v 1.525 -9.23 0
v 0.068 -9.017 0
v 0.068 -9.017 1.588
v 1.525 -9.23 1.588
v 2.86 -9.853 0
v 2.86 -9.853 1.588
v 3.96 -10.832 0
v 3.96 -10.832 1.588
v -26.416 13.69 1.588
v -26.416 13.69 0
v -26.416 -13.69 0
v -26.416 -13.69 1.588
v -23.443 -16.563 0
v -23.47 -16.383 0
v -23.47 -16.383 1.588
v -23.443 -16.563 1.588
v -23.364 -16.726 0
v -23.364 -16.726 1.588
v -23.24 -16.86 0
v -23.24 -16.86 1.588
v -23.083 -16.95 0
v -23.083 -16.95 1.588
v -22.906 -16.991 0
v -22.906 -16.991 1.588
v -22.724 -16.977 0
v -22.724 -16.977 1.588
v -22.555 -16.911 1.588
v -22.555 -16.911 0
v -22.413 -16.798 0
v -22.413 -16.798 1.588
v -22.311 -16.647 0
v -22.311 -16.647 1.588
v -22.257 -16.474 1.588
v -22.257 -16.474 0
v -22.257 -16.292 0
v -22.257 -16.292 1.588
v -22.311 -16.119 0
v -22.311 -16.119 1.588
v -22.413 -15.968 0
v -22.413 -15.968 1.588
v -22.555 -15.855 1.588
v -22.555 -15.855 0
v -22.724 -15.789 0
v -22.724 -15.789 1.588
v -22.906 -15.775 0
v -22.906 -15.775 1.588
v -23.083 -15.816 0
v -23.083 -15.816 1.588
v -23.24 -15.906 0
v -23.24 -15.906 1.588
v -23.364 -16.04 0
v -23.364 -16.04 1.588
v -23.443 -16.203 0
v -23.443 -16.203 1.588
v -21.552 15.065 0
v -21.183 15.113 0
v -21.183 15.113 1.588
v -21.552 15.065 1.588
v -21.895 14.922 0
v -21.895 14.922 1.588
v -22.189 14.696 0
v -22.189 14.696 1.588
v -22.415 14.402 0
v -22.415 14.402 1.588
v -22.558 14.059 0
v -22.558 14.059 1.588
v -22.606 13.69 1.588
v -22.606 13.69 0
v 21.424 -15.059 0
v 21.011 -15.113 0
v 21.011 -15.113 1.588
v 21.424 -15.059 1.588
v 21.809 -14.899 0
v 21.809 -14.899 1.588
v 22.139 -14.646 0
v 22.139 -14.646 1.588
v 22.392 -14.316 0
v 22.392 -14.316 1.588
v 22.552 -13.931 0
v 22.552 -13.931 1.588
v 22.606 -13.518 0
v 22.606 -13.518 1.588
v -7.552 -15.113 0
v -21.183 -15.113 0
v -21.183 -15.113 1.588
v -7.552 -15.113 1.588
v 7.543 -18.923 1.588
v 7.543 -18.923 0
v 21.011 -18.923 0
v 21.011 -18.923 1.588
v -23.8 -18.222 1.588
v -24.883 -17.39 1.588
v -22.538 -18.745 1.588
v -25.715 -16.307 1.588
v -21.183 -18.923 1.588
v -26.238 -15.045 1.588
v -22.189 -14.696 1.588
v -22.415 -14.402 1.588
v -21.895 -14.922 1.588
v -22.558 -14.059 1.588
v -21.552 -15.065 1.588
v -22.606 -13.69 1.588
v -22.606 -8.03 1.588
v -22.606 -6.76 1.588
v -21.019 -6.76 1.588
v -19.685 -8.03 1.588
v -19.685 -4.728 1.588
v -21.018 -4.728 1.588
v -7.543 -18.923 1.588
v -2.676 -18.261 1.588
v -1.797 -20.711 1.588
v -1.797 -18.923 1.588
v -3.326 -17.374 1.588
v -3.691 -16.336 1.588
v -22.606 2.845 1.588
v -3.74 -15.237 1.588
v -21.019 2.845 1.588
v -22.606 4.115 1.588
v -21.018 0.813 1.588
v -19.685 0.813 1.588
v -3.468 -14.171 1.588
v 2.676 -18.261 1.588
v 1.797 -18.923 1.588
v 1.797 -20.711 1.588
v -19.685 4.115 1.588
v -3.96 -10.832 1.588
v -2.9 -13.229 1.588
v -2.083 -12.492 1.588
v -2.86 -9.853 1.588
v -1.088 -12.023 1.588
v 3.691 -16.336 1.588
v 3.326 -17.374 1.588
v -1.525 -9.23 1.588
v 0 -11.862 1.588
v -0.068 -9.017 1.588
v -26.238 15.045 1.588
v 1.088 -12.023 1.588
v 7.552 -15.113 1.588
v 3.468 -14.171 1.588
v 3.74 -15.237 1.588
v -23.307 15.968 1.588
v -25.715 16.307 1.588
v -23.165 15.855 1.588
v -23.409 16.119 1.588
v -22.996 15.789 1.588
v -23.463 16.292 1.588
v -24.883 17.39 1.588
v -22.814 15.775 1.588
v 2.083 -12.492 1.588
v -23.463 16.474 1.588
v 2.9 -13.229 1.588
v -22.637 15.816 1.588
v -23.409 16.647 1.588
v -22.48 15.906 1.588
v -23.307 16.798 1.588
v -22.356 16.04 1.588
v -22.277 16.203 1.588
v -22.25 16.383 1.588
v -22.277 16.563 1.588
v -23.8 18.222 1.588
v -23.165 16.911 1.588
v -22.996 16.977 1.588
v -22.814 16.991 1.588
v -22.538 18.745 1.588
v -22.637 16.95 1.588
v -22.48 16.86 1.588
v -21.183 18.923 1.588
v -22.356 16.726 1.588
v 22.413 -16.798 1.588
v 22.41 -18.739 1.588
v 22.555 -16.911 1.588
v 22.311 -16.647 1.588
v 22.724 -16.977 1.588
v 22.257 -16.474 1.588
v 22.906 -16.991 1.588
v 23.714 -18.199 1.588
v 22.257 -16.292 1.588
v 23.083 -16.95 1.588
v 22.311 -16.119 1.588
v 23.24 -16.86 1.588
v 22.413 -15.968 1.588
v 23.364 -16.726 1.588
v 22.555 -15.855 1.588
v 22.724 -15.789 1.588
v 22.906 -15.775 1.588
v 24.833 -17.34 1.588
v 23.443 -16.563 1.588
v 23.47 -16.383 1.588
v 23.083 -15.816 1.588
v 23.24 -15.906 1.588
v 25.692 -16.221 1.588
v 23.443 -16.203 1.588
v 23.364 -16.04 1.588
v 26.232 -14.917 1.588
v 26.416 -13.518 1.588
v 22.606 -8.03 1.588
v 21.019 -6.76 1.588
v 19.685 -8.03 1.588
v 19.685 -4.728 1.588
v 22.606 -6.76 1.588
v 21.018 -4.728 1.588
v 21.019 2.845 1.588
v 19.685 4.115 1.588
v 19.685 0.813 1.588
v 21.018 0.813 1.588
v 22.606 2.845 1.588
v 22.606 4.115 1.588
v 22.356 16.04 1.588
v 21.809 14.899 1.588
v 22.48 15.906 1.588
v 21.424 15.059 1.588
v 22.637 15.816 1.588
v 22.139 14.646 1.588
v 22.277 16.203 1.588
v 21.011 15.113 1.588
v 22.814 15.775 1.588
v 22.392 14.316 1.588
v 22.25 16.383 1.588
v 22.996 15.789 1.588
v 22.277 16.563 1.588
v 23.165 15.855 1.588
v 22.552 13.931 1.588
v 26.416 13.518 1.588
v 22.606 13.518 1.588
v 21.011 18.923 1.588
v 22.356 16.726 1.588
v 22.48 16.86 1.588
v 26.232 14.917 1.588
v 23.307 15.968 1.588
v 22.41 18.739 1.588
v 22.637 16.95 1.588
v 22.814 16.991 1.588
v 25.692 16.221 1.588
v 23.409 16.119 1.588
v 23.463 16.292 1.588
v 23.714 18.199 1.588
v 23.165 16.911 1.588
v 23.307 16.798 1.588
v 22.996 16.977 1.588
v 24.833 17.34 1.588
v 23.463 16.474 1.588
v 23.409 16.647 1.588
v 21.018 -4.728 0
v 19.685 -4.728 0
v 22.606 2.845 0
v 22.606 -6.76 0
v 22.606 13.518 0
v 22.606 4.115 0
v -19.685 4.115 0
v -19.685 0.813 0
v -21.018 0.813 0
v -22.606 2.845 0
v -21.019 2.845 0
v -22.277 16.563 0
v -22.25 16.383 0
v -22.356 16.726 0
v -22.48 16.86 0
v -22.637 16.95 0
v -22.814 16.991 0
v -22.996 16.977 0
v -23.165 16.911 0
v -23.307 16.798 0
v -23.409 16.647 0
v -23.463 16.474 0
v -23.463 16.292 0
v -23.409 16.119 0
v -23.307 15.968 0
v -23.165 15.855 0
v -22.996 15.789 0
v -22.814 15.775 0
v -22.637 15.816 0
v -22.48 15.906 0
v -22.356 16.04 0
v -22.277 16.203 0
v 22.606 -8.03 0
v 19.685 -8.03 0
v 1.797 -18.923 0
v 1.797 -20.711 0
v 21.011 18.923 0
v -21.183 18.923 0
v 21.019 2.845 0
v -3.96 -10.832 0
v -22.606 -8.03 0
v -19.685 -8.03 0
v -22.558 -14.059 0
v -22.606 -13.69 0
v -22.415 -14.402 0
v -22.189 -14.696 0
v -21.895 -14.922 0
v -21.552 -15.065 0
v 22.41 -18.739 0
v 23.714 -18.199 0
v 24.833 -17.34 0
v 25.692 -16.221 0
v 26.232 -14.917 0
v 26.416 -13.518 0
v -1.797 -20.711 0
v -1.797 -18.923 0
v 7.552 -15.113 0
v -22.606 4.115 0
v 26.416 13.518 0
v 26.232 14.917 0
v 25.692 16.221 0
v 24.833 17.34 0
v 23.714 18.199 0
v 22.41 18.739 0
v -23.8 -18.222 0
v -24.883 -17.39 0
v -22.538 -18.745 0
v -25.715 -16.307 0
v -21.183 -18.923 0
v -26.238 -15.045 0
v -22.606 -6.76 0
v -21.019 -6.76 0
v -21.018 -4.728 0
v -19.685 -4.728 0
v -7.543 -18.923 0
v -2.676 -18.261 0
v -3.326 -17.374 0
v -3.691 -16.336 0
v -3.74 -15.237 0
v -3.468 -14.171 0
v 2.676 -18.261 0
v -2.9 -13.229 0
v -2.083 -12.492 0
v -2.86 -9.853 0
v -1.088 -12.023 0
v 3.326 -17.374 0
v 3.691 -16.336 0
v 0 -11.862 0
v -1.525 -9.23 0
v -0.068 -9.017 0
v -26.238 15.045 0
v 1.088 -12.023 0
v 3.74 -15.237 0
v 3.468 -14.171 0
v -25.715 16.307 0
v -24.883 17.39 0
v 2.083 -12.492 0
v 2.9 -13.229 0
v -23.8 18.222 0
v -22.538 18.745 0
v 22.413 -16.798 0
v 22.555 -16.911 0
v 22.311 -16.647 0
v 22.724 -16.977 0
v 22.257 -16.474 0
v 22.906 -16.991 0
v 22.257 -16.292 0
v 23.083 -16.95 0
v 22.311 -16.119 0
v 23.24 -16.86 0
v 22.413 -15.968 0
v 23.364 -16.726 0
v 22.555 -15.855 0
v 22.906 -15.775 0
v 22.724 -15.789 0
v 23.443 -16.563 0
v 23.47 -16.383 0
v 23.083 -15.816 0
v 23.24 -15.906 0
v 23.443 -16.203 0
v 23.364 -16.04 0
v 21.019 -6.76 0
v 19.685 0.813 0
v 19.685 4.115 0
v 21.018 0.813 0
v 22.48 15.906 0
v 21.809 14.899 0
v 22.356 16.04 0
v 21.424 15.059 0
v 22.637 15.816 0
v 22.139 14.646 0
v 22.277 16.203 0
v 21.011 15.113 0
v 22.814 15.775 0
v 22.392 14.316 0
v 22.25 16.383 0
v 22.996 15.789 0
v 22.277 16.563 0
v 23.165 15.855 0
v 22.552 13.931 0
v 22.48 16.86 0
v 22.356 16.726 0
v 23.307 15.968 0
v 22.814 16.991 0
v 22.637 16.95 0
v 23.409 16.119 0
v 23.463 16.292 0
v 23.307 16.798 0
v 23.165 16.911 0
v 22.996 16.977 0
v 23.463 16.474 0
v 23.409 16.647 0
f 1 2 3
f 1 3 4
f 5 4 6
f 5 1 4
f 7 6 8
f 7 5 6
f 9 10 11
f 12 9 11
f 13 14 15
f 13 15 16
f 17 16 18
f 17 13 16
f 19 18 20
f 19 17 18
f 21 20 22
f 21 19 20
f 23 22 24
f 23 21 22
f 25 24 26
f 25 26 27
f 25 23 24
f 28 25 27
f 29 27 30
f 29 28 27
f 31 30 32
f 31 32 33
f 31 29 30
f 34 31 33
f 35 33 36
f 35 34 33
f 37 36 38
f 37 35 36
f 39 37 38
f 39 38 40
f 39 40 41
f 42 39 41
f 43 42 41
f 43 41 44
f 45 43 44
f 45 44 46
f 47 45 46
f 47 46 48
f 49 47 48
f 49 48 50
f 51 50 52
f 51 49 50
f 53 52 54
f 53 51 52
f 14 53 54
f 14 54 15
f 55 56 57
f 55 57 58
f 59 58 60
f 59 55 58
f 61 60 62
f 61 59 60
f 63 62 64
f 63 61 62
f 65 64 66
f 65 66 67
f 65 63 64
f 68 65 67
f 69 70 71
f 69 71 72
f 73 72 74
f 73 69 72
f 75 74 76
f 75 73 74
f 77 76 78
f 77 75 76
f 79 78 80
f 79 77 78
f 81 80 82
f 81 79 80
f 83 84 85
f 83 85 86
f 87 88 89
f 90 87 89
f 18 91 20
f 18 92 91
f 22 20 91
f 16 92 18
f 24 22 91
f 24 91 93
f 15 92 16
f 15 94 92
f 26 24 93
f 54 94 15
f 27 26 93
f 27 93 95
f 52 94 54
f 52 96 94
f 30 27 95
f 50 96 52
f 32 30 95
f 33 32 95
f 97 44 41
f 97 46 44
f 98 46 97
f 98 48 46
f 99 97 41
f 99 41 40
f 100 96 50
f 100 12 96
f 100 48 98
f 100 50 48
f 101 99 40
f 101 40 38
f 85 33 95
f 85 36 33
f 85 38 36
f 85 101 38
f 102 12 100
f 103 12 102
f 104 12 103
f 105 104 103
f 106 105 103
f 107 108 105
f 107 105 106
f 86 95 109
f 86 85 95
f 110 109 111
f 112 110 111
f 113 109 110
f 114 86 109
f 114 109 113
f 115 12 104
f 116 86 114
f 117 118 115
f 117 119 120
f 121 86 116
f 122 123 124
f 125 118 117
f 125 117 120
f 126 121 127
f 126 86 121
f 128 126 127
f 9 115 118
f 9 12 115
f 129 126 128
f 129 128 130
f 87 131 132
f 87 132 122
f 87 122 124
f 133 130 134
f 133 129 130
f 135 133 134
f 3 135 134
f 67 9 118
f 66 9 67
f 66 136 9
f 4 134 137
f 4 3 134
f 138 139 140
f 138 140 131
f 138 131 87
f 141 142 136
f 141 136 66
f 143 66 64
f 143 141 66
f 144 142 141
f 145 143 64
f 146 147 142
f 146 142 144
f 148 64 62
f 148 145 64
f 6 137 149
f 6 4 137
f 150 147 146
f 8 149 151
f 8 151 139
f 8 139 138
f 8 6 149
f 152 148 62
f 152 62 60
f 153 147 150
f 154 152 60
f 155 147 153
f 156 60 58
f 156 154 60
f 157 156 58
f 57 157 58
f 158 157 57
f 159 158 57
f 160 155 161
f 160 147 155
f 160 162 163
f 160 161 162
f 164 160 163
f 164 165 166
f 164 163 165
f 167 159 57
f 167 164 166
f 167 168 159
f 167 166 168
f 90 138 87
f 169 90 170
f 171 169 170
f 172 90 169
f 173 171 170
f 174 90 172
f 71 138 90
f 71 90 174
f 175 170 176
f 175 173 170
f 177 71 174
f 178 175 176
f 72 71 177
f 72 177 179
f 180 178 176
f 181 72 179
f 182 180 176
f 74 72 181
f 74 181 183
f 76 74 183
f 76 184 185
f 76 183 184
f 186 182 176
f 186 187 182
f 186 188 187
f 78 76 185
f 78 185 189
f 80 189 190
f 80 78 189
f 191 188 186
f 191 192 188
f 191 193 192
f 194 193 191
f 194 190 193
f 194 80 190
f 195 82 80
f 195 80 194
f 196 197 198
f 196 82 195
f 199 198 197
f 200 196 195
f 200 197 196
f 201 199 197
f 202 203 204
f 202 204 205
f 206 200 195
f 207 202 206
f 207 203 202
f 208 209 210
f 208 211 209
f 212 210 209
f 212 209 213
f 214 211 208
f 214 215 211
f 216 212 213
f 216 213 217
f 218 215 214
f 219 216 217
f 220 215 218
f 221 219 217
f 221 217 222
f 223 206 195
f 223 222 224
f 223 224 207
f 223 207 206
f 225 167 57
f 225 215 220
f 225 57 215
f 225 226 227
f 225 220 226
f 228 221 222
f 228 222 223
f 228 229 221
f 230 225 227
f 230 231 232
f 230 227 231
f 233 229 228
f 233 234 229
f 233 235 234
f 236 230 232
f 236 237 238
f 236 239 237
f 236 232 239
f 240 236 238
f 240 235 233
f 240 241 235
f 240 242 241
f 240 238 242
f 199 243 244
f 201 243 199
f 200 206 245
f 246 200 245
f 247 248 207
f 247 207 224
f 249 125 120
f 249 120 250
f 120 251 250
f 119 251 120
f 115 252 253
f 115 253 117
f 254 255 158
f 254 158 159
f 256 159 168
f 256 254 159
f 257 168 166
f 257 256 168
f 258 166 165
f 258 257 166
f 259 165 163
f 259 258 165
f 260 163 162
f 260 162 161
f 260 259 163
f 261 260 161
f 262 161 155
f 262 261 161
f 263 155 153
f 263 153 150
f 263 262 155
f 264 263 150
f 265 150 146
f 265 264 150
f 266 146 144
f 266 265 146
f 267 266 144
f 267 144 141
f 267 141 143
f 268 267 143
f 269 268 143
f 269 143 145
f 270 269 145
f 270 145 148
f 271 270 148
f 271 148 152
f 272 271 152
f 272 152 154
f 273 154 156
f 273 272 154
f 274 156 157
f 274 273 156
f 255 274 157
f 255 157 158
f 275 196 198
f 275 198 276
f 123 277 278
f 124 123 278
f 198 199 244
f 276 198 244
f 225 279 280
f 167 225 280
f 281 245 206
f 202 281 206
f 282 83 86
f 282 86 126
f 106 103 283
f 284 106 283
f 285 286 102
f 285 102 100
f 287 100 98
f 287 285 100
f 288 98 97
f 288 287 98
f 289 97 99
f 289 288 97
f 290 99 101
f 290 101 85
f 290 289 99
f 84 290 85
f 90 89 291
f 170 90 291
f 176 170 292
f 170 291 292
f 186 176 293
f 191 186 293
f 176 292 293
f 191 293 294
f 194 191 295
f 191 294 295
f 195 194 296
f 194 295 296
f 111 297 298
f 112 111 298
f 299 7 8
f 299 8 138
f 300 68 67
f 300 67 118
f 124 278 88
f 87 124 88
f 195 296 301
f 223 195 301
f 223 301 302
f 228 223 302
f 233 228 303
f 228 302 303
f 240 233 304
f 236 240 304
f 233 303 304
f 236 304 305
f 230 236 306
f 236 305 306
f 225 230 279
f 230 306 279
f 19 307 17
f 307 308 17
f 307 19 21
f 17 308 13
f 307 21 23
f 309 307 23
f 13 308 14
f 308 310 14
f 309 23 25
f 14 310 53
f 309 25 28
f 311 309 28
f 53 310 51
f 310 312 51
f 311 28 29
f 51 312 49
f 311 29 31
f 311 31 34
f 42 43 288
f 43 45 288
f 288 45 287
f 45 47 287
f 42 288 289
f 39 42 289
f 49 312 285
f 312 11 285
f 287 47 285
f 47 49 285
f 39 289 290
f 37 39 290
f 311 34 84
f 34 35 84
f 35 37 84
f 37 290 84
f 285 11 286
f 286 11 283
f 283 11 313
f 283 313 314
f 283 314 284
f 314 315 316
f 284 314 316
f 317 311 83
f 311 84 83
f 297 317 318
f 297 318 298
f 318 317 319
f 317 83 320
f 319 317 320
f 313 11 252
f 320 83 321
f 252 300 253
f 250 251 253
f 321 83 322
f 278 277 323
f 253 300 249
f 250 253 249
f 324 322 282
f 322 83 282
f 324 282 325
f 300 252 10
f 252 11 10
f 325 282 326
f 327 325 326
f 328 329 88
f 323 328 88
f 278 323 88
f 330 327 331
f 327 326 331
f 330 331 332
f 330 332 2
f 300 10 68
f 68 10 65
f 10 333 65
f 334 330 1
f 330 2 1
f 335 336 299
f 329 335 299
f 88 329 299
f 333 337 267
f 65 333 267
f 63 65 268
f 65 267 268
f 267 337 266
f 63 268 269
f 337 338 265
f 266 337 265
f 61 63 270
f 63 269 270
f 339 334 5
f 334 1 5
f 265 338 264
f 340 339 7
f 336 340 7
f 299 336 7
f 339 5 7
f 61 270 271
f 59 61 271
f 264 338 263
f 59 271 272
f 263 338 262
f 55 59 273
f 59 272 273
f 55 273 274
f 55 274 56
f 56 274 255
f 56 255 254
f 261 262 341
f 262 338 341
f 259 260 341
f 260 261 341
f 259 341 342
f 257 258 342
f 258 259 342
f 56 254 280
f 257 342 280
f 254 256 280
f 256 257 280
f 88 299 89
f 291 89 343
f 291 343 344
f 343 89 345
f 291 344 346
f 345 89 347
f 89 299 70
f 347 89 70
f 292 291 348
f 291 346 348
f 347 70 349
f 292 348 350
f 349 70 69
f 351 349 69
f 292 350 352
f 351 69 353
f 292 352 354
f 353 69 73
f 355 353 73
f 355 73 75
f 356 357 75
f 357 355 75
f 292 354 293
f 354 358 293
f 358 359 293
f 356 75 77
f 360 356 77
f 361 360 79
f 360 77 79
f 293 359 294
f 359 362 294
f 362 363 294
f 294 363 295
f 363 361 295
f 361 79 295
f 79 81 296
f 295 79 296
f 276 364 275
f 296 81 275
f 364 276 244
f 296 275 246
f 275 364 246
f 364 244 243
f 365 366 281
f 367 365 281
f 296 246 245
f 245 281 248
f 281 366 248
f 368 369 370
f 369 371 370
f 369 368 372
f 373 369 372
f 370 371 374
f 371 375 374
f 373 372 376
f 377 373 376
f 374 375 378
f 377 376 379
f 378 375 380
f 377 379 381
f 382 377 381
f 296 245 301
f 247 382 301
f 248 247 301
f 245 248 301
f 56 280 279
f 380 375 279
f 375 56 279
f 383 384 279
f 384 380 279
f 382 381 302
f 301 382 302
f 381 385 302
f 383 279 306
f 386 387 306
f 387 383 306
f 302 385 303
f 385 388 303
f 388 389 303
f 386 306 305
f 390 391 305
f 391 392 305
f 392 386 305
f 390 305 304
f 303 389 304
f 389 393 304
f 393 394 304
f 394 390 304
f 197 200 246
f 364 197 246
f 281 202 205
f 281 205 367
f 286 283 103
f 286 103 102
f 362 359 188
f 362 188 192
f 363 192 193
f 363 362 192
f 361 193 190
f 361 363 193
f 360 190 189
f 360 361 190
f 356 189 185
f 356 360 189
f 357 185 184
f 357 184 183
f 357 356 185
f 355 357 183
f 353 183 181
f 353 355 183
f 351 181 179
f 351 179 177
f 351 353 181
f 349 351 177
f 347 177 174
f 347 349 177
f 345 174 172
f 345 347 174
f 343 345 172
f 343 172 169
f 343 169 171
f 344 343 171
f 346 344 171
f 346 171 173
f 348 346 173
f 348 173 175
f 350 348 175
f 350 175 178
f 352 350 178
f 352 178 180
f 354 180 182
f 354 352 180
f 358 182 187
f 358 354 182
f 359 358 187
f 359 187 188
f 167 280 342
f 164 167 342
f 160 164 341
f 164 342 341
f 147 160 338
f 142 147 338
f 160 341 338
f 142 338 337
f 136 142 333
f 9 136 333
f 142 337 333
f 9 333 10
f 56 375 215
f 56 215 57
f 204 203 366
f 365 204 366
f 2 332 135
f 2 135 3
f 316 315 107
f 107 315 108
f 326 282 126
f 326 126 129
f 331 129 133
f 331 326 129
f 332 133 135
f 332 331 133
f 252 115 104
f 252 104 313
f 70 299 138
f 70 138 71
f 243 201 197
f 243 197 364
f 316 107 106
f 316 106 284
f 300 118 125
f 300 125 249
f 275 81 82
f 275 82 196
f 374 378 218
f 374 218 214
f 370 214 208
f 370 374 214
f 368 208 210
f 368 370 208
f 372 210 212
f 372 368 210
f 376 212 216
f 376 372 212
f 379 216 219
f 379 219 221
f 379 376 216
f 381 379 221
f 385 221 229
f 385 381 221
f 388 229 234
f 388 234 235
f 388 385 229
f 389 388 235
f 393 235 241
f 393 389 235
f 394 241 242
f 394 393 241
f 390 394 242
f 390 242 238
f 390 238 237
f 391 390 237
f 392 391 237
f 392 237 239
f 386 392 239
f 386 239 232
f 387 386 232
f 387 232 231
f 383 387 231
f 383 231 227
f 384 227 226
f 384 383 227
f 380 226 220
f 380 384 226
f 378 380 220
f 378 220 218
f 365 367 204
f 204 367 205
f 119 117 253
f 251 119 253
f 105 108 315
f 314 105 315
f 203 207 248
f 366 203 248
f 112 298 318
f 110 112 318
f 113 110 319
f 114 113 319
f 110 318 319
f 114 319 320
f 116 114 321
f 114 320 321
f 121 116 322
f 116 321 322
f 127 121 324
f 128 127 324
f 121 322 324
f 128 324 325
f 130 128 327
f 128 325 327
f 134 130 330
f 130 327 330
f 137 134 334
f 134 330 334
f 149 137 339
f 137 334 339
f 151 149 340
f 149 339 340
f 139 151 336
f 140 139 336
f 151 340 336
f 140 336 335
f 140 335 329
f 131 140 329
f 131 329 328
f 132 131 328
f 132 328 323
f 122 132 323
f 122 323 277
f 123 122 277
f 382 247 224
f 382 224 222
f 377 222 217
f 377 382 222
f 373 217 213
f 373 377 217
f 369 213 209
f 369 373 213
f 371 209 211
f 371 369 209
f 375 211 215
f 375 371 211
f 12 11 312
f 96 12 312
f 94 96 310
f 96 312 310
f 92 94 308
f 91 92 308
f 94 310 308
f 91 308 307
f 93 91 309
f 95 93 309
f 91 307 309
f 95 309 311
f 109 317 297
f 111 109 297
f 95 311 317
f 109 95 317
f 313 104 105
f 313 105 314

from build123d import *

# Parameters (mm, degrees)
SKETCH1_R           = 0.6096
BOSS_EXTRUDE1_DEPTH = 1.5875
SKETCH2_W           = 1.5875
SKETCH2_H           = 1.27
BOSS_EXTRUDE2_DEPTH = 2.921
CUT_EXTRUDE1_DEPTH  = 1.5875
SKETCH3_W           = 1.5875
SKETCH3_H           = 5.540367605
CUT_EXTRUDE2_DEPTH  = 1.3335


with BuildPart() as part:
    # Sketch1 → Boss-Extrude1 (new body)
    with BuildSketch(Plane.XY):
        with BuildLine():
            Line((-21.183334762, -18.923), (-7.542517063, -18.923))
            Line((-7.542517063, -18.923), (-1.796769501, -20.710658693))
            Line((-1.796769501, -20.710658693), (-1.796769501, -18.923))
            ThreePointArc((-1.796769501, -18.923), (0, -11.8618), (1.796769501, -18.923))
            Line((1.796769501, -18.923), (1.796769501, -20.710658693))
            Line((1.796769501, -20.710658693), (7.542517063, -18.923))
            Line((7.542517063, -18.923), (21.011390278, -18.923))
            ThreePointArc((21.011390278, -18.923), (24.833026462, -17.340026462), (26.416, -13.518390278))
            Line((26.416, -13.518390278), (26.416, 13.518390278))
            ThreePointArc((26.416, 13.518390278), (24.833026462, 17.340026462), (21.011390278, 18.923))
            Line((21.011390278, 18.923), (-21.183334762, 18.923))
            ThreePointArc((-21.183334762, 18.923), (-24.883387836, 17.390387836), (-26.416, 13.690334762))
            Line((-26.416, 13.690334762), (-26.416, -13.690334762))
            ThreePointArc((-26.416, -13.690334762), (-24.883387836, -17.390387836), (-21.183334762, -18.923))
        make_face()
        with Locations((-22.86, 16.383)):
            Circle(SKETCH1_R, mode=Mode.SUBTRACT)
        with Locations(Location((22.86, 16.383, 0), (0, 0, 180))):
            Circle(SKETCH1_R, mode=Mode.SUBTRACT)
        with Locations((22.86, -16.383)):
            Circle(SKETCH1_R, mode=Mode.SUBTRACT)
        with Locations(Location((-22.86, -16.383, 0), (0, 0, 180))):
            Circle(SKETCH1_R, mode=Mode.SUBTRACT)
        with BuildLine():
            Line((-22.606, 13.690334762), (-22.606, -13.690334762))
            ThreePointArc((-22.606, -13.690334762), (-22.189310999, -14.696310999), (-21.183334762, -15.113))
            Line((-21.183334762, -15.113), (-7.552133781, -15.113))
            Line((-7.552133781, -15.113), (-3.959645297, -10.831638943))
            ThreePointArc((-3.959645297, -10.831638943), (-2.215040295, -9.492956442), (-0.068139526, -9.017))
            Line((-0.068139526, -9.017), (0.068139526, -9.017))
            ThreePointArc((0.068139526, -9.017), (2.215040295, -9.492956442), (3.959645297, -10.831638943))
            Line((3.959645297, -10.831638943), (7.552133781, -15.113))
            Line((7.552133781, -15.113), (21.011390278, -15.113))
            ThreePointArc((21.011390278, -15.113), (22.138949626, -14.645949626), (22.606, -13.518390278))
            Line((22.606, -13.518390278), (22.606, 13.518390278))
            ThreePointArc((22.606, 13.518390278), (22.138949626, 14.645949626), (21.011390278, 15.113))
            Line((21.011390278, 15.113), (-21.183334762, 15.113))
            ThreePointArc((-21.183334762, 15.113), (-22.189310999, 14.696310999), (-22.606, 13.690334762))
        make_face(mode=Mode.SUBTRACT)
    extrude(amount=BOSS_EXTRUDE1_DEPTH)

    # Sketch2 → Boss-Extrude2 (add)
    with BuildSketch(Plane(origin=(-22.606, 0, 0), x_dir=(0, 0, -1), z_dir=(1, 0, 0))):
        with Locations((-0.79375, 3.4798)):
            Rectangle(SKETCH2_W, SKETCH2_H)
        Polygon((0, 1.469264578), (0, 2.8448), (-1.5875, 2.8448), (-1.5875, -6.644691549), (-1.5875, -6.759567605), (0, -6.759567605), align=None)
        Polygon((0, -7.914691549), (0, -6.759567605), (-1.5875, -6.759567605), (-1.5875, -7.914691549), (-1.5875, -8.029567605), (0, -8.029567605), align=None)
    boss_extrude2 = extrude(amount=BOSS_EXTRUDE2_DEPTH)

    # Sketch2<3> → Cut-Extrude1 (cut)
    with BuildSketch(Plane(origin=(-22.606, 0, 0), x_dir=(0, 0, -1), z_dir=(1, 0, 0))):
        Polygon((0, 1.469264578), (0, 2.8448), (-1.5875, 2.8448), (-1.5875, -6.644691549), (-1.5875, -6.759567605), (0, -6.759567605), align=None)
    cut_extrude1 = extrude(amount=CUT_EXTRUDE1_DEPTH, mode=Mode.SUBTRACT)

    # Sketch3 → Cut-Extrude2 (cut)
    with BuildSketch(Plane.ZY.offset(21.0185)):
        with Locations((0.79375, -1.957383802)):
            Rectangle(SKETCH3_W, SKETCH3_H)
    cut_extrude2 = extrude(amount=-CUT_EXTRUDE2_DEPTH, mode=Mode.SUBTRACT)

    # Mirror1: Boss-Extrude2, Cut-Extrude1, Cut-Extrude2 across plane
    add(boss_extrude2.mirror(Plane(origin=(0, 0, 0), x_dir=(0, 0, 1), z_dir=(1, 0, 0))))
    add(cut_extrude1.mirror(Plane(origin=(0, 0, 0), x_dir=(0, 0, 1), z_dir=(1, 0, 0))), mode=Mode.SUBTRACT)
    add(cut_extrude2.mirror(Plane(origin=(0, 0, 0), x_dir=(0, 0, 1), z_dir=(1, 0, 0))), mode=Mode.SUBTRACT)


solid = part.part
